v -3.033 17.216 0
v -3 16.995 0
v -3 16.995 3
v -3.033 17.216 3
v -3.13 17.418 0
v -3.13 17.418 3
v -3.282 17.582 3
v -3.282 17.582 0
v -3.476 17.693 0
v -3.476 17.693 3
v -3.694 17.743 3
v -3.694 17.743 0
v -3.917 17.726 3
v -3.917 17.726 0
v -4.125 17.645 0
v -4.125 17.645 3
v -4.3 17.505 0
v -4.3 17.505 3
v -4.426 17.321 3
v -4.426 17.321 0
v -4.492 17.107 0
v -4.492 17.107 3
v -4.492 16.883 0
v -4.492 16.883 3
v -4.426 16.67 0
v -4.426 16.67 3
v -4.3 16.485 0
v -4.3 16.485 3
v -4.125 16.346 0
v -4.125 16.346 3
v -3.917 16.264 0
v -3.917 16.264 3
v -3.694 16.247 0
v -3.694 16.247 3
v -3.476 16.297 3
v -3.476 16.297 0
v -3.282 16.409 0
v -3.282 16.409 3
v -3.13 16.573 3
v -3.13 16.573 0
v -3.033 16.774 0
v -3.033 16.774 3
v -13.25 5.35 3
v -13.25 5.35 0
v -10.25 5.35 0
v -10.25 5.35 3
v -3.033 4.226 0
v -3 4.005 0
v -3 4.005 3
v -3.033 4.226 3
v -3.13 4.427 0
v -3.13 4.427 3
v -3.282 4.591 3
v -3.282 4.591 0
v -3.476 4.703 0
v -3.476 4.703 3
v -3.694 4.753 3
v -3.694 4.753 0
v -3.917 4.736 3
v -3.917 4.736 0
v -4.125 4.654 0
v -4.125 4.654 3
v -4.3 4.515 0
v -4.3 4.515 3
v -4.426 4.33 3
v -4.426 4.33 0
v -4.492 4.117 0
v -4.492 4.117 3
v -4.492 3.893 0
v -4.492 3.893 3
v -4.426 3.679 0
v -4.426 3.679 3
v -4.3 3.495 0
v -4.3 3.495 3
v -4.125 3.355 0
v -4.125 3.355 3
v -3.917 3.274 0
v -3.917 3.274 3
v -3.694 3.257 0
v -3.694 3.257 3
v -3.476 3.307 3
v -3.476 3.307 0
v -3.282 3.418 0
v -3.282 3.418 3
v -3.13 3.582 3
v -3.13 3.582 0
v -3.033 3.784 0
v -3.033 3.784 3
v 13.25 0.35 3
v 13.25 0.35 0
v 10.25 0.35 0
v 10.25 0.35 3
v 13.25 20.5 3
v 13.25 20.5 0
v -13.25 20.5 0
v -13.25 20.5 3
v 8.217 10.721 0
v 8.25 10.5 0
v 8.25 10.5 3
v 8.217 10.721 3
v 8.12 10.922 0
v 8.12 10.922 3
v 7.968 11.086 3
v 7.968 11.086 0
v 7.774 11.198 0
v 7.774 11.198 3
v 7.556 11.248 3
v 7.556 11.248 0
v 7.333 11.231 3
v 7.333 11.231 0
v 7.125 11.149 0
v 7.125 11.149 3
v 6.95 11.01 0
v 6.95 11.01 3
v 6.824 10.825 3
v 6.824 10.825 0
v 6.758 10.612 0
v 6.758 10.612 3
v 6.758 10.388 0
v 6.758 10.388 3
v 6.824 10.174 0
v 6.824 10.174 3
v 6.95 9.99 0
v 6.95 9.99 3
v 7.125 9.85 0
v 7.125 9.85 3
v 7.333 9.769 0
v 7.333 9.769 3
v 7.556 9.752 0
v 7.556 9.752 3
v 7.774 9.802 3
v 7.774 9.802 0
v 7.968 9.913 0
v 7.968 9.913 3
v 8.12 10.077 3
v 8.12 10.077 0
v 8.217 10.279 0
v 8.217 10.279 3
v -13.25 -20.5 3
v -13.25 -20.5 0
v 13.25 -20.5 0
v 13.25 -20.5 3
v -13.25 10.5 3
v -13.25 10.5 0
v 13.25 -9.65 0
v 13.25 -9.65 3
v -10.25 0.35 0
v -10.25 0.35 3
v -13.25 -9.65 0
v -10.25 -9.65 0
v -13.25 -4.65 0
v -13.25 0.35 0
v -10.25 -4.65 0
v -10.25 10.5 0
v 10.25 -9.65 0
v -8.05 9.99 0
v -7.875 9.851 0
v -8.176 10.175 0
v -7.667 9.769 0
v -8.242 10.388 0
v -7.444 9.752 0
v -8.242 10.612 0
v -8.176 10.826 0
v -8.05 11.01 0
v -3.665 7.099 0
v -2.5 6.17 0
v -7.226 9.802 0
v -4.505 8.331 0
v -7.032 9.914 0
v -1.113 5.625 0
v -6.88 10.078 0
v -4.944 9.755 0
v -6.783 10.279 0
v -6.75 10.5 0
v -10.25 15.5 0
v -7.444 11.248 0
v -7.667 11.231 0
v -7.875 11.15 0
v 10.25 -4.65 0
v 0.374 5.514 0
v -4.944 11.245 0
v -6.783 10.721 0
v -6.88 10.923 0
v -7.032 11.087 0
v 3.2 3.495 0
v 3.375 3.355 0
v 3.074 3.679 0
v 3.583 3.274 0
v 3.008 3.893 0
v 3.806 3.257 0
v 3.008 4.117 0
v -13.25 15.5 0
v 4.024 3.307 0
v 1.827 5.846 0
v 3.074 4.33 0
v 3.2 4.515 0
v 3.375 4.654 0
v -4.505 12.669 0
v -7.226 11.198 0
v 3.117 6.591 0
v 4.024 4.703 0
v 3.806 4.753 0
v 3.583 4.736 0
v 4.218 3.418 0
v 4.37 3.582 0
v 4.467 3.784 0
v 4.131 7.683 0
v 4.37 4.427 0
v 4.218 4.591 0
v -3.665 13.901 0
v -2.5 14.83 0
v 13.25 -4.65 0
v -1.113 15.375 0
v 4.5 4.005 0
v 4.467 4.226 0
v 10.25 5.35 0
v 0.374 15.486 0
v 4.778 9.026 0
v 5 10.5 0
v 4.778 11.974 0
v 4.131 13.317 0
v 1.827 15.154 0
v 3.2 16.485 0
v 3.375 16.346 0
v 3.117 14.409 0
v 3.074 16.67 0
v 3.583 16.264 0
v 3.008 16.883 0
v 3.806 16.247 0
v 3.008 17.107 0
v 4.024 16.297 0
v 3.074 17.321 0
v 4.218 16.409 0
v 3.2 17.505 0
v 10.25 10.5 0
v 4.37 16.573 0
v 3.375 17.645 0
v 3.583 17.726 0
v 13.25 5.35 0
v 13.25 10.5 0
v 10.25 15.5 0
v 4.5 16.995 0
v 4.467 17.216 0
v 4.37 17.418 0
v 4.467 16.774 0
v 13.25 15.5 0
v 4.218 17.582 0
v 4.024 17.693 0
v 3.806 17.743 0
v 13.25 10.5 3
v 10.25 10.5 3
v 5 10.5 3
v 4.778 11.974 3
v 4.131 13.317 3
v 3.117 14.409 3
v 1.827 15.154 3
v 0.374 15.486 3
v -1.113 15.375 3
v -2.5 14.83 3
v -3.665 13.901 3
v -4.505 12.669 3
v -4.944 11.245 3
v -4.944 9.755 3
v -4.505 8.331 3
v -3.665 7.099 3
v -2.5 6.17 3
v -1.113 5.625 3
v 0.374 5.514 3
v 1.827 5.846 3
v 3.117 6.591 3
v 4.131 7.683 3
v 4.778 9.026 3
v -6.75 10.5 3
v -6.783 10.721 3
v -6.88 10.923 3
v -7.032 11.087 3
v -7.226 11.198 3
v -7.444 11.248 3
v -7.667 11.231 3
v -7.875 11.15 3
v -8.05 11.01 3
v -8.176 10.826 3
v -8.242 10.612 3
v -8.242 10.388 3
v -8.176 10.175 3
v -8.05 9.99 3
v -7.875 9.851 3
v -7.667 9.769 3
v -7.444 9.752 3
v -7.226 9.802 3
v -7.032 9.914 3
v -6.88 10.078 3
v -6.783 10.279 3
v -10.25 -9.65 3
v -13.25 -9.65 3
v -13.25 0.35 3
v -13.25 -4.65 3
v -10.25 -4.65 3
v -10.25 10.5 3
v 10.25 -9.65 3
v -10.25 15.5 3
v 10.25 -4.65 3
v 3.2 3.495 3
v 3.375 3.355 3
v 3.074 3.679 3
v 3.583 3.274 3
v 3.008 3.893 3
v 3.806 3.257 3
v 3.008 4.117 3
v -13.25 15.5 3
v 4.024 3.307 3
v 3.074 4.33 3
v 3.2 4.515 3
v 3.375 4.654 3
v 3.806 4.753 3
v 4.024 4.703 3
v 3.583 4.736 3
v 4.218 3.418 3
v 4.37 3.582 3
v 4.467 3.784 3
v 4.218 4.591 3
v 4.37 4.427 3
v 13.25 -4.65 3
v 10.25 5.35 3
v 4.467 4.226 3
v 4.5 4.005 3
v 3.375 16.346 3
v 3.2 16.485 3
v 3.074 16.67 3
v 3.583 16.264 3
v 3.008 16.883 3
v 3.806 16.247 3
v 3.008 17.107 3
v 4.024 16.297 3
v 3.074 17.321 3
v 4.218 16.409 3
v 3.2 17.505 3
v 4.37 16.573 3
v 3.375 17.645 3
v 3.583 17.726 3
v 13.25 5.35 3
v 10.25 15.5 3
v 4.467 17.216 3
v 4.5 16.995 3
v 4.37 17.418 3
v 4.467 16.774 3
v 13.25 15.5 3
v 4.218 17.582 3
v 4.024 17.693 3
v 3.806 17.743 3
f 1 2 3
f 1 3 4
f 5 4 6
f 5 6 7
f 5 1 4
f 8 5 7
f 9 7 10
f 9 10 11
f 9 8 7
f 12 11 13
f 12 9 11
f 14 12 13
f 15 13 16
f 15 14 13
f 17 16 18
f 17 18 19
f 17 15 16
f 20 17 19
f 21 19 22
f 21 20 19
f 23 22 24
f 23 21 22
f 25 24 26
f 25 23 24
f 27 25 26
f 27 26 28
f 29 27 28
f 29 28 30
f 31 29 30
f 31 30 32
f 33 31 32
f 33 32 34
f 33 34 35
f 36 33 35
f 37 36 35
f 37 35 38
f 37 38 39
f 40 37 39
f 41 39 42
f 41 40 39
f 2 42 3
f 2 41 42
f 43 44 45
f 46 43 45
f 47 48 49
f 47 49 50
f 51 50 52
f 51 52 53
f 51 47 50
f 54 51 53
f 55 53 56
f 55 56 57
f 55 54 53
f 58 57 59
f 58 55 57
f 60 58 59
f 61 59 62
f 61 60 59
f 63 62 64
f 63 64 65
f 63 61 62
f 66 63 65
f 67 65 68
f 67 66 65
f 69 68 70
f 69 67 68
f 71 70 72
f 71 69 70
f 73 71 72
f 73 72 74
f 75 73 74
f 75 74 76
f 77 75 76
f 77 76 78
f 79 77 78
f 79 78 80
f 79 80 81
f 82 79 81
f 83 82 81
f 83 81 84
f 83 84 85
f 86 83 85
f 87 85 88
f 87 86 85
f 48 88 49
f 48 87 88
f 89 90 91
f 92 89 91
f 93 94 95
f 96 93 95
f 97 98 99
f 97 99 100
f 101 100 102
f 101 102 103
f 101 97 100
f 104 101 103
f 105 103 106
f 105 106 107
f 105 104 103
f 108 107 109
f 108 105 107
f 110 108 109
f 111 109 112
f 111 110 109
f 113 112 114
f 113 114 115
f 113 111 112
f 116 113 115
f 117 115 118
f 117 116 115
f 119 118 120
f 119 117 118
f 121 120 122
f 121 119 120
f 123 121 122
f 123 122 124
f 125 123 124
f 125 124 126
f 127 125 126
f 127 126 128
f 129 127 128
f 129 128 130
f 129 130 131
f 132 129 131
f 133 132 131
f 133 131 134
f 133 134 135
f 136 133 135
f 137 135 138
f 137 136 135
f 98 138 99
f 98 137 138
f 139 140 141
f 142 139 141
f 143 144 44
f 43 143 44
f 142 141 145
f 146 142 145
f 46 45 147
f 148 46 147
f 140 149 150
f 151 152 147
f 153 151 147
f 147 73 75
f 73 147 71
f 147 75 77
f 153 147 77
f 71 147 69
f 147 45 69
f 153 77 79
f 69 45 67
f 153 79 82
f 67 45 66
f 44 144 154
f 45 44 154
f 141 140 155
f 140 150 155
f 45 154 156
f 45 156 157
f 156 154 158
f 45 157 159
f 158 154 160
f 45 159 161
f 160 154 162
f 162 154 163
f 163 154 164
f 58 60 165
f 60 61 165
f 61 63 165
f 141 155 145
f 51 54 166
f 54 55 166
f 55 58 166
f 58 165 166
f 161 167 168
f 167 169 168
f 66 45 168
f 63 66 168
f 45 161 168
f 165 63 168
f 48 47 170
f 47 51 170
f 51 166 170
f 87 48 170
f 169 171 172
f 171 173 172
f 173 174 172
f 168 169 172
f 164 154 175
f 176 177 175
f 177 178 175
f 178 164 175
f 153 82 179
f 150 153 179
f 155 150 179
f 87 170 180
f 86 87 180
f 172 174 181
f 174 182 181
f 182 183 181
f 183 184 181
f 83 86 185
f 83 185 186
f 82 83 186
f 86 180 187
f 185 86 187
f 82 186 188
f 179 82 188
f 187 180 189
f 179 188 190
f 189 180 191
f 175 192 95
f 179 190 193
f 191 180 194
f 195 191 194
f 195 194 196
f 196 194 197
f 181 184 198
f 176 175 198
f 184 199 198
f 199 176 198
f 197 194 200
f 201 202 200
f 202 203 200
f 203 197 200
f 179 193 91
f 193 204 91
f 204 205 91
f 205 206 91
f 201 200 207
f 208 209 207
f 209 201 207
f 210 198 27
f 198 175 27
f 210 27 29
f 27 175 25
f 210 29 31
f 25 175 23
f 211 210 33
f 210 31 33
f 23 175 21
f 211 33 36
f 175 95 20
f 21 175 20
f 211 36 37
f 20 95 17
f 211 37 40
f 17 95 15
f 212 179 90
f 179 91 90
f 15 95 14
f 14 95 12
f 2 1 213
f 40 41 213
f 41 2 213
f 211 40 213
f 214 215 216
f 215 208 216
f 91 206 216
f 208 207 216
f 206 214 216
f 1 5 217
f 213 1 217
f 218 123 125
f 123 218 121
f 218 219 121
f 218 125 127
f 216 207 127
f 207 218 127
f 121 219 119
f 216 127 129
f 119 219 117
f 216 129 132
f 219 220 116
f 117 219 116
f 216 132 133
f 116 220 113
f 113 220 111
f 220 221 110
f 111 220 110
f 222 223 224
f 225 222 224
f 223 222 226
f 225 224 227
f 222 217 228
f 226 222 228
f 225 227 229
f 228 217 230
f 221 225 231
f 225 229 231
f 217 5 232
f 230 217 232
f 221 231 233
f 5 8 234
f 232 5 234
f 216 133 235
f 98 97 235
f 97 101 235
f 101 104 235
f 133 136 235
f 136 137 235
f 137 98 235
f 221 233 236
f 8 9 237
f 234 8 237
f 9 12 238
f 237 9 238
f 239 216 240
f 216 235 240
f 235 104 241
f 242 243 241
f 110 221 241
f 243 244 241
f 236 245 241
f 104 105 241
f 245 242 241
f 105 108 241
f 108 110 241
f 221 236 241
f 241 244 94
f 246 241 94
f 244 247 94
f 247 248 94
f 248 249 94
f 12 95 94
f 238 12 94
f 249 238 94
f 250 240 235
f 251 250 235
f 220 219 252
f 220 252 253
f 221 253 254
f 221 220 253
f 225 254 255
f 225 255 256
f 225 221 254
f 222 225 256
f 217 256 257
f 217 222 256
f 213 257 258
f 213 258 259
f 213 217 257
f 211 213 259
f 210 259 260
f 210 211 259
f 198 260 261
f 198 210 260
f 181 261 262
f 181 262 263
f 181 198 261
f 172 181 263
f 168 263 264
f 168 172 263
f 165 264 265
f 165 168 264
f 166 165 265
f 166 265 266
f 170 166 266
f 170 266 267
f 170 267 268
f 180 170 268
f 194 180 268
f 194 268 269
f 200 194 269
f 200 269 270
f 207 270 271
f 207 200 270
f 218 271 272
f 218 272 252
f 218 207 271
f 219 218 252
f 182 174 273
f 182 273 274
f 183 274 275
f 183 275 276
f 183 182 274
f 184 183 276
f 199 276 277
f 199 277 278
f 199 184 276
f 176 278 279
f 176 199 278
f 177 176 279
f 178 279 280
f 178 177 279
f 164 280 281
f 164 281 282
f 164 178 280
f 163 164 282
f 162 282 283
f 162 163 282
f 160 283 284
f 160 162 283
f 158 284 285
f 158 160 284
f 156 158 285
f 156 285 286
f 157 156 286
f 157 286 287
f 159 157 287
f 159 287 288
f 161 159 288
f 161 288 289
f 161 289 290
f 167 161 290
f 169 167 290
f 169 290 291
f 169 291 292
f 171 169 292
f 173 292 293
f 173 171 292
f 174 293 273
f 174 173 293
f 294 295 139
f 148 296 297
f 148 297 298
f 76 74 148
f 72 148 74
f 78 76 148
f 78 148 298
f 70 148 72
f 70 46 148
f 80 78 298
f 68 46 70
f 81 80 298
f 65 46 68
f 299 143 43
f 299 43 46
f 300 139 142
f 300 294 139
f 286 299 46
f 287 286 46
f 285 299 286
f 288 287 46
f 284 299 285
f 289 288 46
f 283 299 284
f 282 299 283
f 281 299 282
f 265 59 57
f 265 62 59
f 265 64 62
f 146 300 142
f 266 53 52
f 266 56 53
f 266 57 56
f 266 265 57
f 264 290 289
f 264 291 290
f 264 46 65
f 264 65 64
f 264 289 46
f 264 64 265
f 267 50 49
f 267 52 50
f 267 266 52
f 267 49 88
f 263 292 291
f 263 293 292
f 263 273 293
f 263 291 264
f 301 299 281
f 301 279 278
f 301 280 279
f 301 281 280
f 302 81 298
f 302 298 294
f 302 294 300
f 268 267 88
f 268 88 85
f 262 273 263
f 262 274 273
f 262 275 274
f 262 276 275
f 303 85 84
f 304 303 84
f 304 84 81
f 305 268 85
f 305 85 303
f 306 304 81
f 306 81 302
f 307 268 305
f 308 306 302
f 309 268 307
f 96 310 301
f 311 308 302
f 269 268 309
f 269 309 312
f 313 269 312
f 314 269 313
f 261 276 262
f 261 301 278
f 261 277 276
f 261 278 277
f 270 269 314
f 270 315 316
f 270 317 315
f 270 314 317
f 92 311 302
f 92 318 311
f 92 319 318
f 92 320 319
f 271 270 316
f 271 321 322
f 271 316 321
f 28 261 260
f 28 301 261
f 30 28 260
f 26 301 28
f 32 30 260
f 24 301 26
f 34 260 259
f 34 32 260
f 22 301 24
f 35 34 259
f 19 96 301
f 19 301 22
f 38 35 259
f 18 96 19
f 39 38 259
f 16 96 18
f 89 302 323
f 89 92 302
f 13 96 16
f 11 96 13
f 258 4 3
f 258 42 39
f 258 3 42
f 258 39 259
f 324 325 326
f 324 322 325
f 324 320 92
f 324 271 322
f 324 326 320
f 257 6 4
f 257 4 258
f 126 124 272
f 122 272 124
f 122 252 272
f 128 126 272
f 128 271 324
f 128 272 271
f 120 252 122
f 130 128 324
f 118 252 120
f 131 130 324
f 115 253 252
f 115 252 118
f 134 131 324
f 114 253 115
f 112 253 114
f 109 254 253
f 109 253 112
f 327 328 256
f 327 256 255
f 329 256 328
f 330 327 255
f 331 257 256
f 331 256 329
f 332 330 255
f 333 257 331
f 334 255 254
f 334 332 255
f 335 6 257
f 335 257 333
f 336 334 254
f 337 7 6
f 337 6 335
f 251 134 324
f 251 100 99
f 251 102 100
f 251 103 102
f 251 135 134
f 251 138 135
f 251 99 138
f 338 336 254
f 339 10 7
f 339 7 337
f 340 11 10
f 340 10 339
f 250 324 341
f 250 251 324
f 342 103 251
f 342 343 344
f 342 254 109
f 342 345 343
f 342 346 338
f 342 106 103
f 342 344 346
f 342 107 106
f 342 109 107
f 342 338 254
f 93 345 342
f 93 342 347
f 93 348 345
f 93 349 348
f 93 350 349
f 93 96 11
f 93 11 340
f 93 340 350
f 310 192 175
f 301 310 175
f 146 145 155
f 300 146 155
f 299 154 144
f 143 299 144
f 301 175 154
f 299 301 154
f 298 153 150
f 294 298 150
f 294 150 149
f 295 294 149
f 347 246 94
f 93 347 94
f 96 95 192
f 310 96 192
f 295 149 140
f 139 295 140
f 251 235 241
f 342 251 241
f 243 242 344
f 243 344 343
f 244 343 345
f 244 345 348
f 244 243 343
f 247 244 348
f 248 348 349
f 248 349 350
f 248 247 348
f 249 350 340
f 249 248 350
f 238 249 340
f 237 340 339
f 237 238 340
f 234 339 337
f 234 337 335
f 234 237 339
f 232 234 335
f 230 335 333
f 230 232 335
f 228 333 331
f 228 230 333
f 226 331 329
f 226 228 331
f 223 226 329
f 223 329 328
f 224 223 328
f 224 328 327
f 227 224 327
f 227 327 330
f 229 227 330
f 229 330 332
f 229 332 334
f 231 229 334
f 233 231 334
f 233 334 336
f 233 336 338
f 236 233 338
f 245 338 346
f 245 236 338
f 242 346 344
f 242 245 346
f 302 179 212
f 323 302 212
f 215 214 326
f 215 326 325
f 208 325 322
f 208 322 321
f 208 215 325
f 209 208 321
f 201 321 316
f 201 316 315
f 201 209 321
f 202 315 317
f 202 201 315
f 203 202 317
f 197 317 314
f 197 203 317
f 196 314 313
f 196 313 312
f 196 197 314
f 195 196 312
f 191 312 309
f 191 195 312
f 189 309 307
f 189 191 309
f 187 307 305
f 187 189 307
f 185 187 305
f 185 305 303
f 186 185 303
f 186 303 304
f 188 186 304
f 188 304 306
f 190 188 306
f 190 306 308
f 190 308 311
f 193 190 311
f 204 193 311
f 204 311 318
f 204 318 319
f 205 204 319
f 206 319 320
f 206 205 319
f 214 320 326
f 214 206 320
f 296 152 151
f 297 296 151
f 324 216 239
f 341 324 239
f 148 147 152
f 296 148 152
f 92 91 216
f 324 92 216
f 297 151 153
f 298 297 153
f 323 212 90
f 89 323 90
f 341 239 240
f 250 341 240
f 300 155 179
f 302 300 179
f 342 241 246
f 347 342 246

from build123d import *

# Parameters (mm, degrees)
SKETCH1_R           = 5
SKETCH1_R_2         = 0.75
BOSS_EXTRUDE1_DEPTH = 3


with BuildPart() as part:
    # Sketch1 → Boss-Extrude1 (new body)
    with BuildSketch(Plane.XY):
        Polygon((-13.25, 15.5), (-10.25, 15.5), (-10.25, 10.5), (-13.25, 10.5), (-13.25, 5.35), (-10.25, 5.35), (-10.25, 0.35), (-13.25, 0.35), (-13.25, -4.65), (-10.25, -4.65), (-10.25, -9.65), (-13.25, -9.65), (-13.25, -20.5), (13.25, -20.5), (13.25, -9.65), (10.25, -9.65), (10.25, -4.65), (13.25, -4.65), (13.25, 0.35), (10.25, 0.35), (10.25, 5.35), (13.25, 5.35), (13.25, 10.5), (10.25, 10.5), (10.25, 15.5), (13.25, 15.5), (13.25, 20.5), (-13.25, 20.5), align=None)
        with Locations((0, 10.5)):
            Circle(SKETCH1_R, mode=Mode.SUBTRACT)
        with Locations((3.75, 16.995190528)):
            Circle(SKETCH1_R_2, mode=Mode.SUBTRACT)
        with Locations((7.499999997, 10.499776304)):
            Circle(SKETCH1_R_2, mode=Mode.SUBTRACT)
        with Locations((3.75, 4.004809472)):
            Circle(SKETCH1_R_2, mode=Mode.SUBTRACT)
        with Locations((-3.75, 4.004809472)):
            Circle(SKETCH1_R_2, mode=Mode.SUBTRACT)
        with Locations((-7.499999997, 10.500223696)):
            Circle(SKETCH1_R_2, mode=Mode.SUBTRACT)
        with Locations((-3.75, 16.995190528)):
            Circle(SKETCH1_R_2, mode=Mode.SUBTRACT)
    extrude(amount=BOSS_EXTRUDE1_DEPTH)


solid = part.part
